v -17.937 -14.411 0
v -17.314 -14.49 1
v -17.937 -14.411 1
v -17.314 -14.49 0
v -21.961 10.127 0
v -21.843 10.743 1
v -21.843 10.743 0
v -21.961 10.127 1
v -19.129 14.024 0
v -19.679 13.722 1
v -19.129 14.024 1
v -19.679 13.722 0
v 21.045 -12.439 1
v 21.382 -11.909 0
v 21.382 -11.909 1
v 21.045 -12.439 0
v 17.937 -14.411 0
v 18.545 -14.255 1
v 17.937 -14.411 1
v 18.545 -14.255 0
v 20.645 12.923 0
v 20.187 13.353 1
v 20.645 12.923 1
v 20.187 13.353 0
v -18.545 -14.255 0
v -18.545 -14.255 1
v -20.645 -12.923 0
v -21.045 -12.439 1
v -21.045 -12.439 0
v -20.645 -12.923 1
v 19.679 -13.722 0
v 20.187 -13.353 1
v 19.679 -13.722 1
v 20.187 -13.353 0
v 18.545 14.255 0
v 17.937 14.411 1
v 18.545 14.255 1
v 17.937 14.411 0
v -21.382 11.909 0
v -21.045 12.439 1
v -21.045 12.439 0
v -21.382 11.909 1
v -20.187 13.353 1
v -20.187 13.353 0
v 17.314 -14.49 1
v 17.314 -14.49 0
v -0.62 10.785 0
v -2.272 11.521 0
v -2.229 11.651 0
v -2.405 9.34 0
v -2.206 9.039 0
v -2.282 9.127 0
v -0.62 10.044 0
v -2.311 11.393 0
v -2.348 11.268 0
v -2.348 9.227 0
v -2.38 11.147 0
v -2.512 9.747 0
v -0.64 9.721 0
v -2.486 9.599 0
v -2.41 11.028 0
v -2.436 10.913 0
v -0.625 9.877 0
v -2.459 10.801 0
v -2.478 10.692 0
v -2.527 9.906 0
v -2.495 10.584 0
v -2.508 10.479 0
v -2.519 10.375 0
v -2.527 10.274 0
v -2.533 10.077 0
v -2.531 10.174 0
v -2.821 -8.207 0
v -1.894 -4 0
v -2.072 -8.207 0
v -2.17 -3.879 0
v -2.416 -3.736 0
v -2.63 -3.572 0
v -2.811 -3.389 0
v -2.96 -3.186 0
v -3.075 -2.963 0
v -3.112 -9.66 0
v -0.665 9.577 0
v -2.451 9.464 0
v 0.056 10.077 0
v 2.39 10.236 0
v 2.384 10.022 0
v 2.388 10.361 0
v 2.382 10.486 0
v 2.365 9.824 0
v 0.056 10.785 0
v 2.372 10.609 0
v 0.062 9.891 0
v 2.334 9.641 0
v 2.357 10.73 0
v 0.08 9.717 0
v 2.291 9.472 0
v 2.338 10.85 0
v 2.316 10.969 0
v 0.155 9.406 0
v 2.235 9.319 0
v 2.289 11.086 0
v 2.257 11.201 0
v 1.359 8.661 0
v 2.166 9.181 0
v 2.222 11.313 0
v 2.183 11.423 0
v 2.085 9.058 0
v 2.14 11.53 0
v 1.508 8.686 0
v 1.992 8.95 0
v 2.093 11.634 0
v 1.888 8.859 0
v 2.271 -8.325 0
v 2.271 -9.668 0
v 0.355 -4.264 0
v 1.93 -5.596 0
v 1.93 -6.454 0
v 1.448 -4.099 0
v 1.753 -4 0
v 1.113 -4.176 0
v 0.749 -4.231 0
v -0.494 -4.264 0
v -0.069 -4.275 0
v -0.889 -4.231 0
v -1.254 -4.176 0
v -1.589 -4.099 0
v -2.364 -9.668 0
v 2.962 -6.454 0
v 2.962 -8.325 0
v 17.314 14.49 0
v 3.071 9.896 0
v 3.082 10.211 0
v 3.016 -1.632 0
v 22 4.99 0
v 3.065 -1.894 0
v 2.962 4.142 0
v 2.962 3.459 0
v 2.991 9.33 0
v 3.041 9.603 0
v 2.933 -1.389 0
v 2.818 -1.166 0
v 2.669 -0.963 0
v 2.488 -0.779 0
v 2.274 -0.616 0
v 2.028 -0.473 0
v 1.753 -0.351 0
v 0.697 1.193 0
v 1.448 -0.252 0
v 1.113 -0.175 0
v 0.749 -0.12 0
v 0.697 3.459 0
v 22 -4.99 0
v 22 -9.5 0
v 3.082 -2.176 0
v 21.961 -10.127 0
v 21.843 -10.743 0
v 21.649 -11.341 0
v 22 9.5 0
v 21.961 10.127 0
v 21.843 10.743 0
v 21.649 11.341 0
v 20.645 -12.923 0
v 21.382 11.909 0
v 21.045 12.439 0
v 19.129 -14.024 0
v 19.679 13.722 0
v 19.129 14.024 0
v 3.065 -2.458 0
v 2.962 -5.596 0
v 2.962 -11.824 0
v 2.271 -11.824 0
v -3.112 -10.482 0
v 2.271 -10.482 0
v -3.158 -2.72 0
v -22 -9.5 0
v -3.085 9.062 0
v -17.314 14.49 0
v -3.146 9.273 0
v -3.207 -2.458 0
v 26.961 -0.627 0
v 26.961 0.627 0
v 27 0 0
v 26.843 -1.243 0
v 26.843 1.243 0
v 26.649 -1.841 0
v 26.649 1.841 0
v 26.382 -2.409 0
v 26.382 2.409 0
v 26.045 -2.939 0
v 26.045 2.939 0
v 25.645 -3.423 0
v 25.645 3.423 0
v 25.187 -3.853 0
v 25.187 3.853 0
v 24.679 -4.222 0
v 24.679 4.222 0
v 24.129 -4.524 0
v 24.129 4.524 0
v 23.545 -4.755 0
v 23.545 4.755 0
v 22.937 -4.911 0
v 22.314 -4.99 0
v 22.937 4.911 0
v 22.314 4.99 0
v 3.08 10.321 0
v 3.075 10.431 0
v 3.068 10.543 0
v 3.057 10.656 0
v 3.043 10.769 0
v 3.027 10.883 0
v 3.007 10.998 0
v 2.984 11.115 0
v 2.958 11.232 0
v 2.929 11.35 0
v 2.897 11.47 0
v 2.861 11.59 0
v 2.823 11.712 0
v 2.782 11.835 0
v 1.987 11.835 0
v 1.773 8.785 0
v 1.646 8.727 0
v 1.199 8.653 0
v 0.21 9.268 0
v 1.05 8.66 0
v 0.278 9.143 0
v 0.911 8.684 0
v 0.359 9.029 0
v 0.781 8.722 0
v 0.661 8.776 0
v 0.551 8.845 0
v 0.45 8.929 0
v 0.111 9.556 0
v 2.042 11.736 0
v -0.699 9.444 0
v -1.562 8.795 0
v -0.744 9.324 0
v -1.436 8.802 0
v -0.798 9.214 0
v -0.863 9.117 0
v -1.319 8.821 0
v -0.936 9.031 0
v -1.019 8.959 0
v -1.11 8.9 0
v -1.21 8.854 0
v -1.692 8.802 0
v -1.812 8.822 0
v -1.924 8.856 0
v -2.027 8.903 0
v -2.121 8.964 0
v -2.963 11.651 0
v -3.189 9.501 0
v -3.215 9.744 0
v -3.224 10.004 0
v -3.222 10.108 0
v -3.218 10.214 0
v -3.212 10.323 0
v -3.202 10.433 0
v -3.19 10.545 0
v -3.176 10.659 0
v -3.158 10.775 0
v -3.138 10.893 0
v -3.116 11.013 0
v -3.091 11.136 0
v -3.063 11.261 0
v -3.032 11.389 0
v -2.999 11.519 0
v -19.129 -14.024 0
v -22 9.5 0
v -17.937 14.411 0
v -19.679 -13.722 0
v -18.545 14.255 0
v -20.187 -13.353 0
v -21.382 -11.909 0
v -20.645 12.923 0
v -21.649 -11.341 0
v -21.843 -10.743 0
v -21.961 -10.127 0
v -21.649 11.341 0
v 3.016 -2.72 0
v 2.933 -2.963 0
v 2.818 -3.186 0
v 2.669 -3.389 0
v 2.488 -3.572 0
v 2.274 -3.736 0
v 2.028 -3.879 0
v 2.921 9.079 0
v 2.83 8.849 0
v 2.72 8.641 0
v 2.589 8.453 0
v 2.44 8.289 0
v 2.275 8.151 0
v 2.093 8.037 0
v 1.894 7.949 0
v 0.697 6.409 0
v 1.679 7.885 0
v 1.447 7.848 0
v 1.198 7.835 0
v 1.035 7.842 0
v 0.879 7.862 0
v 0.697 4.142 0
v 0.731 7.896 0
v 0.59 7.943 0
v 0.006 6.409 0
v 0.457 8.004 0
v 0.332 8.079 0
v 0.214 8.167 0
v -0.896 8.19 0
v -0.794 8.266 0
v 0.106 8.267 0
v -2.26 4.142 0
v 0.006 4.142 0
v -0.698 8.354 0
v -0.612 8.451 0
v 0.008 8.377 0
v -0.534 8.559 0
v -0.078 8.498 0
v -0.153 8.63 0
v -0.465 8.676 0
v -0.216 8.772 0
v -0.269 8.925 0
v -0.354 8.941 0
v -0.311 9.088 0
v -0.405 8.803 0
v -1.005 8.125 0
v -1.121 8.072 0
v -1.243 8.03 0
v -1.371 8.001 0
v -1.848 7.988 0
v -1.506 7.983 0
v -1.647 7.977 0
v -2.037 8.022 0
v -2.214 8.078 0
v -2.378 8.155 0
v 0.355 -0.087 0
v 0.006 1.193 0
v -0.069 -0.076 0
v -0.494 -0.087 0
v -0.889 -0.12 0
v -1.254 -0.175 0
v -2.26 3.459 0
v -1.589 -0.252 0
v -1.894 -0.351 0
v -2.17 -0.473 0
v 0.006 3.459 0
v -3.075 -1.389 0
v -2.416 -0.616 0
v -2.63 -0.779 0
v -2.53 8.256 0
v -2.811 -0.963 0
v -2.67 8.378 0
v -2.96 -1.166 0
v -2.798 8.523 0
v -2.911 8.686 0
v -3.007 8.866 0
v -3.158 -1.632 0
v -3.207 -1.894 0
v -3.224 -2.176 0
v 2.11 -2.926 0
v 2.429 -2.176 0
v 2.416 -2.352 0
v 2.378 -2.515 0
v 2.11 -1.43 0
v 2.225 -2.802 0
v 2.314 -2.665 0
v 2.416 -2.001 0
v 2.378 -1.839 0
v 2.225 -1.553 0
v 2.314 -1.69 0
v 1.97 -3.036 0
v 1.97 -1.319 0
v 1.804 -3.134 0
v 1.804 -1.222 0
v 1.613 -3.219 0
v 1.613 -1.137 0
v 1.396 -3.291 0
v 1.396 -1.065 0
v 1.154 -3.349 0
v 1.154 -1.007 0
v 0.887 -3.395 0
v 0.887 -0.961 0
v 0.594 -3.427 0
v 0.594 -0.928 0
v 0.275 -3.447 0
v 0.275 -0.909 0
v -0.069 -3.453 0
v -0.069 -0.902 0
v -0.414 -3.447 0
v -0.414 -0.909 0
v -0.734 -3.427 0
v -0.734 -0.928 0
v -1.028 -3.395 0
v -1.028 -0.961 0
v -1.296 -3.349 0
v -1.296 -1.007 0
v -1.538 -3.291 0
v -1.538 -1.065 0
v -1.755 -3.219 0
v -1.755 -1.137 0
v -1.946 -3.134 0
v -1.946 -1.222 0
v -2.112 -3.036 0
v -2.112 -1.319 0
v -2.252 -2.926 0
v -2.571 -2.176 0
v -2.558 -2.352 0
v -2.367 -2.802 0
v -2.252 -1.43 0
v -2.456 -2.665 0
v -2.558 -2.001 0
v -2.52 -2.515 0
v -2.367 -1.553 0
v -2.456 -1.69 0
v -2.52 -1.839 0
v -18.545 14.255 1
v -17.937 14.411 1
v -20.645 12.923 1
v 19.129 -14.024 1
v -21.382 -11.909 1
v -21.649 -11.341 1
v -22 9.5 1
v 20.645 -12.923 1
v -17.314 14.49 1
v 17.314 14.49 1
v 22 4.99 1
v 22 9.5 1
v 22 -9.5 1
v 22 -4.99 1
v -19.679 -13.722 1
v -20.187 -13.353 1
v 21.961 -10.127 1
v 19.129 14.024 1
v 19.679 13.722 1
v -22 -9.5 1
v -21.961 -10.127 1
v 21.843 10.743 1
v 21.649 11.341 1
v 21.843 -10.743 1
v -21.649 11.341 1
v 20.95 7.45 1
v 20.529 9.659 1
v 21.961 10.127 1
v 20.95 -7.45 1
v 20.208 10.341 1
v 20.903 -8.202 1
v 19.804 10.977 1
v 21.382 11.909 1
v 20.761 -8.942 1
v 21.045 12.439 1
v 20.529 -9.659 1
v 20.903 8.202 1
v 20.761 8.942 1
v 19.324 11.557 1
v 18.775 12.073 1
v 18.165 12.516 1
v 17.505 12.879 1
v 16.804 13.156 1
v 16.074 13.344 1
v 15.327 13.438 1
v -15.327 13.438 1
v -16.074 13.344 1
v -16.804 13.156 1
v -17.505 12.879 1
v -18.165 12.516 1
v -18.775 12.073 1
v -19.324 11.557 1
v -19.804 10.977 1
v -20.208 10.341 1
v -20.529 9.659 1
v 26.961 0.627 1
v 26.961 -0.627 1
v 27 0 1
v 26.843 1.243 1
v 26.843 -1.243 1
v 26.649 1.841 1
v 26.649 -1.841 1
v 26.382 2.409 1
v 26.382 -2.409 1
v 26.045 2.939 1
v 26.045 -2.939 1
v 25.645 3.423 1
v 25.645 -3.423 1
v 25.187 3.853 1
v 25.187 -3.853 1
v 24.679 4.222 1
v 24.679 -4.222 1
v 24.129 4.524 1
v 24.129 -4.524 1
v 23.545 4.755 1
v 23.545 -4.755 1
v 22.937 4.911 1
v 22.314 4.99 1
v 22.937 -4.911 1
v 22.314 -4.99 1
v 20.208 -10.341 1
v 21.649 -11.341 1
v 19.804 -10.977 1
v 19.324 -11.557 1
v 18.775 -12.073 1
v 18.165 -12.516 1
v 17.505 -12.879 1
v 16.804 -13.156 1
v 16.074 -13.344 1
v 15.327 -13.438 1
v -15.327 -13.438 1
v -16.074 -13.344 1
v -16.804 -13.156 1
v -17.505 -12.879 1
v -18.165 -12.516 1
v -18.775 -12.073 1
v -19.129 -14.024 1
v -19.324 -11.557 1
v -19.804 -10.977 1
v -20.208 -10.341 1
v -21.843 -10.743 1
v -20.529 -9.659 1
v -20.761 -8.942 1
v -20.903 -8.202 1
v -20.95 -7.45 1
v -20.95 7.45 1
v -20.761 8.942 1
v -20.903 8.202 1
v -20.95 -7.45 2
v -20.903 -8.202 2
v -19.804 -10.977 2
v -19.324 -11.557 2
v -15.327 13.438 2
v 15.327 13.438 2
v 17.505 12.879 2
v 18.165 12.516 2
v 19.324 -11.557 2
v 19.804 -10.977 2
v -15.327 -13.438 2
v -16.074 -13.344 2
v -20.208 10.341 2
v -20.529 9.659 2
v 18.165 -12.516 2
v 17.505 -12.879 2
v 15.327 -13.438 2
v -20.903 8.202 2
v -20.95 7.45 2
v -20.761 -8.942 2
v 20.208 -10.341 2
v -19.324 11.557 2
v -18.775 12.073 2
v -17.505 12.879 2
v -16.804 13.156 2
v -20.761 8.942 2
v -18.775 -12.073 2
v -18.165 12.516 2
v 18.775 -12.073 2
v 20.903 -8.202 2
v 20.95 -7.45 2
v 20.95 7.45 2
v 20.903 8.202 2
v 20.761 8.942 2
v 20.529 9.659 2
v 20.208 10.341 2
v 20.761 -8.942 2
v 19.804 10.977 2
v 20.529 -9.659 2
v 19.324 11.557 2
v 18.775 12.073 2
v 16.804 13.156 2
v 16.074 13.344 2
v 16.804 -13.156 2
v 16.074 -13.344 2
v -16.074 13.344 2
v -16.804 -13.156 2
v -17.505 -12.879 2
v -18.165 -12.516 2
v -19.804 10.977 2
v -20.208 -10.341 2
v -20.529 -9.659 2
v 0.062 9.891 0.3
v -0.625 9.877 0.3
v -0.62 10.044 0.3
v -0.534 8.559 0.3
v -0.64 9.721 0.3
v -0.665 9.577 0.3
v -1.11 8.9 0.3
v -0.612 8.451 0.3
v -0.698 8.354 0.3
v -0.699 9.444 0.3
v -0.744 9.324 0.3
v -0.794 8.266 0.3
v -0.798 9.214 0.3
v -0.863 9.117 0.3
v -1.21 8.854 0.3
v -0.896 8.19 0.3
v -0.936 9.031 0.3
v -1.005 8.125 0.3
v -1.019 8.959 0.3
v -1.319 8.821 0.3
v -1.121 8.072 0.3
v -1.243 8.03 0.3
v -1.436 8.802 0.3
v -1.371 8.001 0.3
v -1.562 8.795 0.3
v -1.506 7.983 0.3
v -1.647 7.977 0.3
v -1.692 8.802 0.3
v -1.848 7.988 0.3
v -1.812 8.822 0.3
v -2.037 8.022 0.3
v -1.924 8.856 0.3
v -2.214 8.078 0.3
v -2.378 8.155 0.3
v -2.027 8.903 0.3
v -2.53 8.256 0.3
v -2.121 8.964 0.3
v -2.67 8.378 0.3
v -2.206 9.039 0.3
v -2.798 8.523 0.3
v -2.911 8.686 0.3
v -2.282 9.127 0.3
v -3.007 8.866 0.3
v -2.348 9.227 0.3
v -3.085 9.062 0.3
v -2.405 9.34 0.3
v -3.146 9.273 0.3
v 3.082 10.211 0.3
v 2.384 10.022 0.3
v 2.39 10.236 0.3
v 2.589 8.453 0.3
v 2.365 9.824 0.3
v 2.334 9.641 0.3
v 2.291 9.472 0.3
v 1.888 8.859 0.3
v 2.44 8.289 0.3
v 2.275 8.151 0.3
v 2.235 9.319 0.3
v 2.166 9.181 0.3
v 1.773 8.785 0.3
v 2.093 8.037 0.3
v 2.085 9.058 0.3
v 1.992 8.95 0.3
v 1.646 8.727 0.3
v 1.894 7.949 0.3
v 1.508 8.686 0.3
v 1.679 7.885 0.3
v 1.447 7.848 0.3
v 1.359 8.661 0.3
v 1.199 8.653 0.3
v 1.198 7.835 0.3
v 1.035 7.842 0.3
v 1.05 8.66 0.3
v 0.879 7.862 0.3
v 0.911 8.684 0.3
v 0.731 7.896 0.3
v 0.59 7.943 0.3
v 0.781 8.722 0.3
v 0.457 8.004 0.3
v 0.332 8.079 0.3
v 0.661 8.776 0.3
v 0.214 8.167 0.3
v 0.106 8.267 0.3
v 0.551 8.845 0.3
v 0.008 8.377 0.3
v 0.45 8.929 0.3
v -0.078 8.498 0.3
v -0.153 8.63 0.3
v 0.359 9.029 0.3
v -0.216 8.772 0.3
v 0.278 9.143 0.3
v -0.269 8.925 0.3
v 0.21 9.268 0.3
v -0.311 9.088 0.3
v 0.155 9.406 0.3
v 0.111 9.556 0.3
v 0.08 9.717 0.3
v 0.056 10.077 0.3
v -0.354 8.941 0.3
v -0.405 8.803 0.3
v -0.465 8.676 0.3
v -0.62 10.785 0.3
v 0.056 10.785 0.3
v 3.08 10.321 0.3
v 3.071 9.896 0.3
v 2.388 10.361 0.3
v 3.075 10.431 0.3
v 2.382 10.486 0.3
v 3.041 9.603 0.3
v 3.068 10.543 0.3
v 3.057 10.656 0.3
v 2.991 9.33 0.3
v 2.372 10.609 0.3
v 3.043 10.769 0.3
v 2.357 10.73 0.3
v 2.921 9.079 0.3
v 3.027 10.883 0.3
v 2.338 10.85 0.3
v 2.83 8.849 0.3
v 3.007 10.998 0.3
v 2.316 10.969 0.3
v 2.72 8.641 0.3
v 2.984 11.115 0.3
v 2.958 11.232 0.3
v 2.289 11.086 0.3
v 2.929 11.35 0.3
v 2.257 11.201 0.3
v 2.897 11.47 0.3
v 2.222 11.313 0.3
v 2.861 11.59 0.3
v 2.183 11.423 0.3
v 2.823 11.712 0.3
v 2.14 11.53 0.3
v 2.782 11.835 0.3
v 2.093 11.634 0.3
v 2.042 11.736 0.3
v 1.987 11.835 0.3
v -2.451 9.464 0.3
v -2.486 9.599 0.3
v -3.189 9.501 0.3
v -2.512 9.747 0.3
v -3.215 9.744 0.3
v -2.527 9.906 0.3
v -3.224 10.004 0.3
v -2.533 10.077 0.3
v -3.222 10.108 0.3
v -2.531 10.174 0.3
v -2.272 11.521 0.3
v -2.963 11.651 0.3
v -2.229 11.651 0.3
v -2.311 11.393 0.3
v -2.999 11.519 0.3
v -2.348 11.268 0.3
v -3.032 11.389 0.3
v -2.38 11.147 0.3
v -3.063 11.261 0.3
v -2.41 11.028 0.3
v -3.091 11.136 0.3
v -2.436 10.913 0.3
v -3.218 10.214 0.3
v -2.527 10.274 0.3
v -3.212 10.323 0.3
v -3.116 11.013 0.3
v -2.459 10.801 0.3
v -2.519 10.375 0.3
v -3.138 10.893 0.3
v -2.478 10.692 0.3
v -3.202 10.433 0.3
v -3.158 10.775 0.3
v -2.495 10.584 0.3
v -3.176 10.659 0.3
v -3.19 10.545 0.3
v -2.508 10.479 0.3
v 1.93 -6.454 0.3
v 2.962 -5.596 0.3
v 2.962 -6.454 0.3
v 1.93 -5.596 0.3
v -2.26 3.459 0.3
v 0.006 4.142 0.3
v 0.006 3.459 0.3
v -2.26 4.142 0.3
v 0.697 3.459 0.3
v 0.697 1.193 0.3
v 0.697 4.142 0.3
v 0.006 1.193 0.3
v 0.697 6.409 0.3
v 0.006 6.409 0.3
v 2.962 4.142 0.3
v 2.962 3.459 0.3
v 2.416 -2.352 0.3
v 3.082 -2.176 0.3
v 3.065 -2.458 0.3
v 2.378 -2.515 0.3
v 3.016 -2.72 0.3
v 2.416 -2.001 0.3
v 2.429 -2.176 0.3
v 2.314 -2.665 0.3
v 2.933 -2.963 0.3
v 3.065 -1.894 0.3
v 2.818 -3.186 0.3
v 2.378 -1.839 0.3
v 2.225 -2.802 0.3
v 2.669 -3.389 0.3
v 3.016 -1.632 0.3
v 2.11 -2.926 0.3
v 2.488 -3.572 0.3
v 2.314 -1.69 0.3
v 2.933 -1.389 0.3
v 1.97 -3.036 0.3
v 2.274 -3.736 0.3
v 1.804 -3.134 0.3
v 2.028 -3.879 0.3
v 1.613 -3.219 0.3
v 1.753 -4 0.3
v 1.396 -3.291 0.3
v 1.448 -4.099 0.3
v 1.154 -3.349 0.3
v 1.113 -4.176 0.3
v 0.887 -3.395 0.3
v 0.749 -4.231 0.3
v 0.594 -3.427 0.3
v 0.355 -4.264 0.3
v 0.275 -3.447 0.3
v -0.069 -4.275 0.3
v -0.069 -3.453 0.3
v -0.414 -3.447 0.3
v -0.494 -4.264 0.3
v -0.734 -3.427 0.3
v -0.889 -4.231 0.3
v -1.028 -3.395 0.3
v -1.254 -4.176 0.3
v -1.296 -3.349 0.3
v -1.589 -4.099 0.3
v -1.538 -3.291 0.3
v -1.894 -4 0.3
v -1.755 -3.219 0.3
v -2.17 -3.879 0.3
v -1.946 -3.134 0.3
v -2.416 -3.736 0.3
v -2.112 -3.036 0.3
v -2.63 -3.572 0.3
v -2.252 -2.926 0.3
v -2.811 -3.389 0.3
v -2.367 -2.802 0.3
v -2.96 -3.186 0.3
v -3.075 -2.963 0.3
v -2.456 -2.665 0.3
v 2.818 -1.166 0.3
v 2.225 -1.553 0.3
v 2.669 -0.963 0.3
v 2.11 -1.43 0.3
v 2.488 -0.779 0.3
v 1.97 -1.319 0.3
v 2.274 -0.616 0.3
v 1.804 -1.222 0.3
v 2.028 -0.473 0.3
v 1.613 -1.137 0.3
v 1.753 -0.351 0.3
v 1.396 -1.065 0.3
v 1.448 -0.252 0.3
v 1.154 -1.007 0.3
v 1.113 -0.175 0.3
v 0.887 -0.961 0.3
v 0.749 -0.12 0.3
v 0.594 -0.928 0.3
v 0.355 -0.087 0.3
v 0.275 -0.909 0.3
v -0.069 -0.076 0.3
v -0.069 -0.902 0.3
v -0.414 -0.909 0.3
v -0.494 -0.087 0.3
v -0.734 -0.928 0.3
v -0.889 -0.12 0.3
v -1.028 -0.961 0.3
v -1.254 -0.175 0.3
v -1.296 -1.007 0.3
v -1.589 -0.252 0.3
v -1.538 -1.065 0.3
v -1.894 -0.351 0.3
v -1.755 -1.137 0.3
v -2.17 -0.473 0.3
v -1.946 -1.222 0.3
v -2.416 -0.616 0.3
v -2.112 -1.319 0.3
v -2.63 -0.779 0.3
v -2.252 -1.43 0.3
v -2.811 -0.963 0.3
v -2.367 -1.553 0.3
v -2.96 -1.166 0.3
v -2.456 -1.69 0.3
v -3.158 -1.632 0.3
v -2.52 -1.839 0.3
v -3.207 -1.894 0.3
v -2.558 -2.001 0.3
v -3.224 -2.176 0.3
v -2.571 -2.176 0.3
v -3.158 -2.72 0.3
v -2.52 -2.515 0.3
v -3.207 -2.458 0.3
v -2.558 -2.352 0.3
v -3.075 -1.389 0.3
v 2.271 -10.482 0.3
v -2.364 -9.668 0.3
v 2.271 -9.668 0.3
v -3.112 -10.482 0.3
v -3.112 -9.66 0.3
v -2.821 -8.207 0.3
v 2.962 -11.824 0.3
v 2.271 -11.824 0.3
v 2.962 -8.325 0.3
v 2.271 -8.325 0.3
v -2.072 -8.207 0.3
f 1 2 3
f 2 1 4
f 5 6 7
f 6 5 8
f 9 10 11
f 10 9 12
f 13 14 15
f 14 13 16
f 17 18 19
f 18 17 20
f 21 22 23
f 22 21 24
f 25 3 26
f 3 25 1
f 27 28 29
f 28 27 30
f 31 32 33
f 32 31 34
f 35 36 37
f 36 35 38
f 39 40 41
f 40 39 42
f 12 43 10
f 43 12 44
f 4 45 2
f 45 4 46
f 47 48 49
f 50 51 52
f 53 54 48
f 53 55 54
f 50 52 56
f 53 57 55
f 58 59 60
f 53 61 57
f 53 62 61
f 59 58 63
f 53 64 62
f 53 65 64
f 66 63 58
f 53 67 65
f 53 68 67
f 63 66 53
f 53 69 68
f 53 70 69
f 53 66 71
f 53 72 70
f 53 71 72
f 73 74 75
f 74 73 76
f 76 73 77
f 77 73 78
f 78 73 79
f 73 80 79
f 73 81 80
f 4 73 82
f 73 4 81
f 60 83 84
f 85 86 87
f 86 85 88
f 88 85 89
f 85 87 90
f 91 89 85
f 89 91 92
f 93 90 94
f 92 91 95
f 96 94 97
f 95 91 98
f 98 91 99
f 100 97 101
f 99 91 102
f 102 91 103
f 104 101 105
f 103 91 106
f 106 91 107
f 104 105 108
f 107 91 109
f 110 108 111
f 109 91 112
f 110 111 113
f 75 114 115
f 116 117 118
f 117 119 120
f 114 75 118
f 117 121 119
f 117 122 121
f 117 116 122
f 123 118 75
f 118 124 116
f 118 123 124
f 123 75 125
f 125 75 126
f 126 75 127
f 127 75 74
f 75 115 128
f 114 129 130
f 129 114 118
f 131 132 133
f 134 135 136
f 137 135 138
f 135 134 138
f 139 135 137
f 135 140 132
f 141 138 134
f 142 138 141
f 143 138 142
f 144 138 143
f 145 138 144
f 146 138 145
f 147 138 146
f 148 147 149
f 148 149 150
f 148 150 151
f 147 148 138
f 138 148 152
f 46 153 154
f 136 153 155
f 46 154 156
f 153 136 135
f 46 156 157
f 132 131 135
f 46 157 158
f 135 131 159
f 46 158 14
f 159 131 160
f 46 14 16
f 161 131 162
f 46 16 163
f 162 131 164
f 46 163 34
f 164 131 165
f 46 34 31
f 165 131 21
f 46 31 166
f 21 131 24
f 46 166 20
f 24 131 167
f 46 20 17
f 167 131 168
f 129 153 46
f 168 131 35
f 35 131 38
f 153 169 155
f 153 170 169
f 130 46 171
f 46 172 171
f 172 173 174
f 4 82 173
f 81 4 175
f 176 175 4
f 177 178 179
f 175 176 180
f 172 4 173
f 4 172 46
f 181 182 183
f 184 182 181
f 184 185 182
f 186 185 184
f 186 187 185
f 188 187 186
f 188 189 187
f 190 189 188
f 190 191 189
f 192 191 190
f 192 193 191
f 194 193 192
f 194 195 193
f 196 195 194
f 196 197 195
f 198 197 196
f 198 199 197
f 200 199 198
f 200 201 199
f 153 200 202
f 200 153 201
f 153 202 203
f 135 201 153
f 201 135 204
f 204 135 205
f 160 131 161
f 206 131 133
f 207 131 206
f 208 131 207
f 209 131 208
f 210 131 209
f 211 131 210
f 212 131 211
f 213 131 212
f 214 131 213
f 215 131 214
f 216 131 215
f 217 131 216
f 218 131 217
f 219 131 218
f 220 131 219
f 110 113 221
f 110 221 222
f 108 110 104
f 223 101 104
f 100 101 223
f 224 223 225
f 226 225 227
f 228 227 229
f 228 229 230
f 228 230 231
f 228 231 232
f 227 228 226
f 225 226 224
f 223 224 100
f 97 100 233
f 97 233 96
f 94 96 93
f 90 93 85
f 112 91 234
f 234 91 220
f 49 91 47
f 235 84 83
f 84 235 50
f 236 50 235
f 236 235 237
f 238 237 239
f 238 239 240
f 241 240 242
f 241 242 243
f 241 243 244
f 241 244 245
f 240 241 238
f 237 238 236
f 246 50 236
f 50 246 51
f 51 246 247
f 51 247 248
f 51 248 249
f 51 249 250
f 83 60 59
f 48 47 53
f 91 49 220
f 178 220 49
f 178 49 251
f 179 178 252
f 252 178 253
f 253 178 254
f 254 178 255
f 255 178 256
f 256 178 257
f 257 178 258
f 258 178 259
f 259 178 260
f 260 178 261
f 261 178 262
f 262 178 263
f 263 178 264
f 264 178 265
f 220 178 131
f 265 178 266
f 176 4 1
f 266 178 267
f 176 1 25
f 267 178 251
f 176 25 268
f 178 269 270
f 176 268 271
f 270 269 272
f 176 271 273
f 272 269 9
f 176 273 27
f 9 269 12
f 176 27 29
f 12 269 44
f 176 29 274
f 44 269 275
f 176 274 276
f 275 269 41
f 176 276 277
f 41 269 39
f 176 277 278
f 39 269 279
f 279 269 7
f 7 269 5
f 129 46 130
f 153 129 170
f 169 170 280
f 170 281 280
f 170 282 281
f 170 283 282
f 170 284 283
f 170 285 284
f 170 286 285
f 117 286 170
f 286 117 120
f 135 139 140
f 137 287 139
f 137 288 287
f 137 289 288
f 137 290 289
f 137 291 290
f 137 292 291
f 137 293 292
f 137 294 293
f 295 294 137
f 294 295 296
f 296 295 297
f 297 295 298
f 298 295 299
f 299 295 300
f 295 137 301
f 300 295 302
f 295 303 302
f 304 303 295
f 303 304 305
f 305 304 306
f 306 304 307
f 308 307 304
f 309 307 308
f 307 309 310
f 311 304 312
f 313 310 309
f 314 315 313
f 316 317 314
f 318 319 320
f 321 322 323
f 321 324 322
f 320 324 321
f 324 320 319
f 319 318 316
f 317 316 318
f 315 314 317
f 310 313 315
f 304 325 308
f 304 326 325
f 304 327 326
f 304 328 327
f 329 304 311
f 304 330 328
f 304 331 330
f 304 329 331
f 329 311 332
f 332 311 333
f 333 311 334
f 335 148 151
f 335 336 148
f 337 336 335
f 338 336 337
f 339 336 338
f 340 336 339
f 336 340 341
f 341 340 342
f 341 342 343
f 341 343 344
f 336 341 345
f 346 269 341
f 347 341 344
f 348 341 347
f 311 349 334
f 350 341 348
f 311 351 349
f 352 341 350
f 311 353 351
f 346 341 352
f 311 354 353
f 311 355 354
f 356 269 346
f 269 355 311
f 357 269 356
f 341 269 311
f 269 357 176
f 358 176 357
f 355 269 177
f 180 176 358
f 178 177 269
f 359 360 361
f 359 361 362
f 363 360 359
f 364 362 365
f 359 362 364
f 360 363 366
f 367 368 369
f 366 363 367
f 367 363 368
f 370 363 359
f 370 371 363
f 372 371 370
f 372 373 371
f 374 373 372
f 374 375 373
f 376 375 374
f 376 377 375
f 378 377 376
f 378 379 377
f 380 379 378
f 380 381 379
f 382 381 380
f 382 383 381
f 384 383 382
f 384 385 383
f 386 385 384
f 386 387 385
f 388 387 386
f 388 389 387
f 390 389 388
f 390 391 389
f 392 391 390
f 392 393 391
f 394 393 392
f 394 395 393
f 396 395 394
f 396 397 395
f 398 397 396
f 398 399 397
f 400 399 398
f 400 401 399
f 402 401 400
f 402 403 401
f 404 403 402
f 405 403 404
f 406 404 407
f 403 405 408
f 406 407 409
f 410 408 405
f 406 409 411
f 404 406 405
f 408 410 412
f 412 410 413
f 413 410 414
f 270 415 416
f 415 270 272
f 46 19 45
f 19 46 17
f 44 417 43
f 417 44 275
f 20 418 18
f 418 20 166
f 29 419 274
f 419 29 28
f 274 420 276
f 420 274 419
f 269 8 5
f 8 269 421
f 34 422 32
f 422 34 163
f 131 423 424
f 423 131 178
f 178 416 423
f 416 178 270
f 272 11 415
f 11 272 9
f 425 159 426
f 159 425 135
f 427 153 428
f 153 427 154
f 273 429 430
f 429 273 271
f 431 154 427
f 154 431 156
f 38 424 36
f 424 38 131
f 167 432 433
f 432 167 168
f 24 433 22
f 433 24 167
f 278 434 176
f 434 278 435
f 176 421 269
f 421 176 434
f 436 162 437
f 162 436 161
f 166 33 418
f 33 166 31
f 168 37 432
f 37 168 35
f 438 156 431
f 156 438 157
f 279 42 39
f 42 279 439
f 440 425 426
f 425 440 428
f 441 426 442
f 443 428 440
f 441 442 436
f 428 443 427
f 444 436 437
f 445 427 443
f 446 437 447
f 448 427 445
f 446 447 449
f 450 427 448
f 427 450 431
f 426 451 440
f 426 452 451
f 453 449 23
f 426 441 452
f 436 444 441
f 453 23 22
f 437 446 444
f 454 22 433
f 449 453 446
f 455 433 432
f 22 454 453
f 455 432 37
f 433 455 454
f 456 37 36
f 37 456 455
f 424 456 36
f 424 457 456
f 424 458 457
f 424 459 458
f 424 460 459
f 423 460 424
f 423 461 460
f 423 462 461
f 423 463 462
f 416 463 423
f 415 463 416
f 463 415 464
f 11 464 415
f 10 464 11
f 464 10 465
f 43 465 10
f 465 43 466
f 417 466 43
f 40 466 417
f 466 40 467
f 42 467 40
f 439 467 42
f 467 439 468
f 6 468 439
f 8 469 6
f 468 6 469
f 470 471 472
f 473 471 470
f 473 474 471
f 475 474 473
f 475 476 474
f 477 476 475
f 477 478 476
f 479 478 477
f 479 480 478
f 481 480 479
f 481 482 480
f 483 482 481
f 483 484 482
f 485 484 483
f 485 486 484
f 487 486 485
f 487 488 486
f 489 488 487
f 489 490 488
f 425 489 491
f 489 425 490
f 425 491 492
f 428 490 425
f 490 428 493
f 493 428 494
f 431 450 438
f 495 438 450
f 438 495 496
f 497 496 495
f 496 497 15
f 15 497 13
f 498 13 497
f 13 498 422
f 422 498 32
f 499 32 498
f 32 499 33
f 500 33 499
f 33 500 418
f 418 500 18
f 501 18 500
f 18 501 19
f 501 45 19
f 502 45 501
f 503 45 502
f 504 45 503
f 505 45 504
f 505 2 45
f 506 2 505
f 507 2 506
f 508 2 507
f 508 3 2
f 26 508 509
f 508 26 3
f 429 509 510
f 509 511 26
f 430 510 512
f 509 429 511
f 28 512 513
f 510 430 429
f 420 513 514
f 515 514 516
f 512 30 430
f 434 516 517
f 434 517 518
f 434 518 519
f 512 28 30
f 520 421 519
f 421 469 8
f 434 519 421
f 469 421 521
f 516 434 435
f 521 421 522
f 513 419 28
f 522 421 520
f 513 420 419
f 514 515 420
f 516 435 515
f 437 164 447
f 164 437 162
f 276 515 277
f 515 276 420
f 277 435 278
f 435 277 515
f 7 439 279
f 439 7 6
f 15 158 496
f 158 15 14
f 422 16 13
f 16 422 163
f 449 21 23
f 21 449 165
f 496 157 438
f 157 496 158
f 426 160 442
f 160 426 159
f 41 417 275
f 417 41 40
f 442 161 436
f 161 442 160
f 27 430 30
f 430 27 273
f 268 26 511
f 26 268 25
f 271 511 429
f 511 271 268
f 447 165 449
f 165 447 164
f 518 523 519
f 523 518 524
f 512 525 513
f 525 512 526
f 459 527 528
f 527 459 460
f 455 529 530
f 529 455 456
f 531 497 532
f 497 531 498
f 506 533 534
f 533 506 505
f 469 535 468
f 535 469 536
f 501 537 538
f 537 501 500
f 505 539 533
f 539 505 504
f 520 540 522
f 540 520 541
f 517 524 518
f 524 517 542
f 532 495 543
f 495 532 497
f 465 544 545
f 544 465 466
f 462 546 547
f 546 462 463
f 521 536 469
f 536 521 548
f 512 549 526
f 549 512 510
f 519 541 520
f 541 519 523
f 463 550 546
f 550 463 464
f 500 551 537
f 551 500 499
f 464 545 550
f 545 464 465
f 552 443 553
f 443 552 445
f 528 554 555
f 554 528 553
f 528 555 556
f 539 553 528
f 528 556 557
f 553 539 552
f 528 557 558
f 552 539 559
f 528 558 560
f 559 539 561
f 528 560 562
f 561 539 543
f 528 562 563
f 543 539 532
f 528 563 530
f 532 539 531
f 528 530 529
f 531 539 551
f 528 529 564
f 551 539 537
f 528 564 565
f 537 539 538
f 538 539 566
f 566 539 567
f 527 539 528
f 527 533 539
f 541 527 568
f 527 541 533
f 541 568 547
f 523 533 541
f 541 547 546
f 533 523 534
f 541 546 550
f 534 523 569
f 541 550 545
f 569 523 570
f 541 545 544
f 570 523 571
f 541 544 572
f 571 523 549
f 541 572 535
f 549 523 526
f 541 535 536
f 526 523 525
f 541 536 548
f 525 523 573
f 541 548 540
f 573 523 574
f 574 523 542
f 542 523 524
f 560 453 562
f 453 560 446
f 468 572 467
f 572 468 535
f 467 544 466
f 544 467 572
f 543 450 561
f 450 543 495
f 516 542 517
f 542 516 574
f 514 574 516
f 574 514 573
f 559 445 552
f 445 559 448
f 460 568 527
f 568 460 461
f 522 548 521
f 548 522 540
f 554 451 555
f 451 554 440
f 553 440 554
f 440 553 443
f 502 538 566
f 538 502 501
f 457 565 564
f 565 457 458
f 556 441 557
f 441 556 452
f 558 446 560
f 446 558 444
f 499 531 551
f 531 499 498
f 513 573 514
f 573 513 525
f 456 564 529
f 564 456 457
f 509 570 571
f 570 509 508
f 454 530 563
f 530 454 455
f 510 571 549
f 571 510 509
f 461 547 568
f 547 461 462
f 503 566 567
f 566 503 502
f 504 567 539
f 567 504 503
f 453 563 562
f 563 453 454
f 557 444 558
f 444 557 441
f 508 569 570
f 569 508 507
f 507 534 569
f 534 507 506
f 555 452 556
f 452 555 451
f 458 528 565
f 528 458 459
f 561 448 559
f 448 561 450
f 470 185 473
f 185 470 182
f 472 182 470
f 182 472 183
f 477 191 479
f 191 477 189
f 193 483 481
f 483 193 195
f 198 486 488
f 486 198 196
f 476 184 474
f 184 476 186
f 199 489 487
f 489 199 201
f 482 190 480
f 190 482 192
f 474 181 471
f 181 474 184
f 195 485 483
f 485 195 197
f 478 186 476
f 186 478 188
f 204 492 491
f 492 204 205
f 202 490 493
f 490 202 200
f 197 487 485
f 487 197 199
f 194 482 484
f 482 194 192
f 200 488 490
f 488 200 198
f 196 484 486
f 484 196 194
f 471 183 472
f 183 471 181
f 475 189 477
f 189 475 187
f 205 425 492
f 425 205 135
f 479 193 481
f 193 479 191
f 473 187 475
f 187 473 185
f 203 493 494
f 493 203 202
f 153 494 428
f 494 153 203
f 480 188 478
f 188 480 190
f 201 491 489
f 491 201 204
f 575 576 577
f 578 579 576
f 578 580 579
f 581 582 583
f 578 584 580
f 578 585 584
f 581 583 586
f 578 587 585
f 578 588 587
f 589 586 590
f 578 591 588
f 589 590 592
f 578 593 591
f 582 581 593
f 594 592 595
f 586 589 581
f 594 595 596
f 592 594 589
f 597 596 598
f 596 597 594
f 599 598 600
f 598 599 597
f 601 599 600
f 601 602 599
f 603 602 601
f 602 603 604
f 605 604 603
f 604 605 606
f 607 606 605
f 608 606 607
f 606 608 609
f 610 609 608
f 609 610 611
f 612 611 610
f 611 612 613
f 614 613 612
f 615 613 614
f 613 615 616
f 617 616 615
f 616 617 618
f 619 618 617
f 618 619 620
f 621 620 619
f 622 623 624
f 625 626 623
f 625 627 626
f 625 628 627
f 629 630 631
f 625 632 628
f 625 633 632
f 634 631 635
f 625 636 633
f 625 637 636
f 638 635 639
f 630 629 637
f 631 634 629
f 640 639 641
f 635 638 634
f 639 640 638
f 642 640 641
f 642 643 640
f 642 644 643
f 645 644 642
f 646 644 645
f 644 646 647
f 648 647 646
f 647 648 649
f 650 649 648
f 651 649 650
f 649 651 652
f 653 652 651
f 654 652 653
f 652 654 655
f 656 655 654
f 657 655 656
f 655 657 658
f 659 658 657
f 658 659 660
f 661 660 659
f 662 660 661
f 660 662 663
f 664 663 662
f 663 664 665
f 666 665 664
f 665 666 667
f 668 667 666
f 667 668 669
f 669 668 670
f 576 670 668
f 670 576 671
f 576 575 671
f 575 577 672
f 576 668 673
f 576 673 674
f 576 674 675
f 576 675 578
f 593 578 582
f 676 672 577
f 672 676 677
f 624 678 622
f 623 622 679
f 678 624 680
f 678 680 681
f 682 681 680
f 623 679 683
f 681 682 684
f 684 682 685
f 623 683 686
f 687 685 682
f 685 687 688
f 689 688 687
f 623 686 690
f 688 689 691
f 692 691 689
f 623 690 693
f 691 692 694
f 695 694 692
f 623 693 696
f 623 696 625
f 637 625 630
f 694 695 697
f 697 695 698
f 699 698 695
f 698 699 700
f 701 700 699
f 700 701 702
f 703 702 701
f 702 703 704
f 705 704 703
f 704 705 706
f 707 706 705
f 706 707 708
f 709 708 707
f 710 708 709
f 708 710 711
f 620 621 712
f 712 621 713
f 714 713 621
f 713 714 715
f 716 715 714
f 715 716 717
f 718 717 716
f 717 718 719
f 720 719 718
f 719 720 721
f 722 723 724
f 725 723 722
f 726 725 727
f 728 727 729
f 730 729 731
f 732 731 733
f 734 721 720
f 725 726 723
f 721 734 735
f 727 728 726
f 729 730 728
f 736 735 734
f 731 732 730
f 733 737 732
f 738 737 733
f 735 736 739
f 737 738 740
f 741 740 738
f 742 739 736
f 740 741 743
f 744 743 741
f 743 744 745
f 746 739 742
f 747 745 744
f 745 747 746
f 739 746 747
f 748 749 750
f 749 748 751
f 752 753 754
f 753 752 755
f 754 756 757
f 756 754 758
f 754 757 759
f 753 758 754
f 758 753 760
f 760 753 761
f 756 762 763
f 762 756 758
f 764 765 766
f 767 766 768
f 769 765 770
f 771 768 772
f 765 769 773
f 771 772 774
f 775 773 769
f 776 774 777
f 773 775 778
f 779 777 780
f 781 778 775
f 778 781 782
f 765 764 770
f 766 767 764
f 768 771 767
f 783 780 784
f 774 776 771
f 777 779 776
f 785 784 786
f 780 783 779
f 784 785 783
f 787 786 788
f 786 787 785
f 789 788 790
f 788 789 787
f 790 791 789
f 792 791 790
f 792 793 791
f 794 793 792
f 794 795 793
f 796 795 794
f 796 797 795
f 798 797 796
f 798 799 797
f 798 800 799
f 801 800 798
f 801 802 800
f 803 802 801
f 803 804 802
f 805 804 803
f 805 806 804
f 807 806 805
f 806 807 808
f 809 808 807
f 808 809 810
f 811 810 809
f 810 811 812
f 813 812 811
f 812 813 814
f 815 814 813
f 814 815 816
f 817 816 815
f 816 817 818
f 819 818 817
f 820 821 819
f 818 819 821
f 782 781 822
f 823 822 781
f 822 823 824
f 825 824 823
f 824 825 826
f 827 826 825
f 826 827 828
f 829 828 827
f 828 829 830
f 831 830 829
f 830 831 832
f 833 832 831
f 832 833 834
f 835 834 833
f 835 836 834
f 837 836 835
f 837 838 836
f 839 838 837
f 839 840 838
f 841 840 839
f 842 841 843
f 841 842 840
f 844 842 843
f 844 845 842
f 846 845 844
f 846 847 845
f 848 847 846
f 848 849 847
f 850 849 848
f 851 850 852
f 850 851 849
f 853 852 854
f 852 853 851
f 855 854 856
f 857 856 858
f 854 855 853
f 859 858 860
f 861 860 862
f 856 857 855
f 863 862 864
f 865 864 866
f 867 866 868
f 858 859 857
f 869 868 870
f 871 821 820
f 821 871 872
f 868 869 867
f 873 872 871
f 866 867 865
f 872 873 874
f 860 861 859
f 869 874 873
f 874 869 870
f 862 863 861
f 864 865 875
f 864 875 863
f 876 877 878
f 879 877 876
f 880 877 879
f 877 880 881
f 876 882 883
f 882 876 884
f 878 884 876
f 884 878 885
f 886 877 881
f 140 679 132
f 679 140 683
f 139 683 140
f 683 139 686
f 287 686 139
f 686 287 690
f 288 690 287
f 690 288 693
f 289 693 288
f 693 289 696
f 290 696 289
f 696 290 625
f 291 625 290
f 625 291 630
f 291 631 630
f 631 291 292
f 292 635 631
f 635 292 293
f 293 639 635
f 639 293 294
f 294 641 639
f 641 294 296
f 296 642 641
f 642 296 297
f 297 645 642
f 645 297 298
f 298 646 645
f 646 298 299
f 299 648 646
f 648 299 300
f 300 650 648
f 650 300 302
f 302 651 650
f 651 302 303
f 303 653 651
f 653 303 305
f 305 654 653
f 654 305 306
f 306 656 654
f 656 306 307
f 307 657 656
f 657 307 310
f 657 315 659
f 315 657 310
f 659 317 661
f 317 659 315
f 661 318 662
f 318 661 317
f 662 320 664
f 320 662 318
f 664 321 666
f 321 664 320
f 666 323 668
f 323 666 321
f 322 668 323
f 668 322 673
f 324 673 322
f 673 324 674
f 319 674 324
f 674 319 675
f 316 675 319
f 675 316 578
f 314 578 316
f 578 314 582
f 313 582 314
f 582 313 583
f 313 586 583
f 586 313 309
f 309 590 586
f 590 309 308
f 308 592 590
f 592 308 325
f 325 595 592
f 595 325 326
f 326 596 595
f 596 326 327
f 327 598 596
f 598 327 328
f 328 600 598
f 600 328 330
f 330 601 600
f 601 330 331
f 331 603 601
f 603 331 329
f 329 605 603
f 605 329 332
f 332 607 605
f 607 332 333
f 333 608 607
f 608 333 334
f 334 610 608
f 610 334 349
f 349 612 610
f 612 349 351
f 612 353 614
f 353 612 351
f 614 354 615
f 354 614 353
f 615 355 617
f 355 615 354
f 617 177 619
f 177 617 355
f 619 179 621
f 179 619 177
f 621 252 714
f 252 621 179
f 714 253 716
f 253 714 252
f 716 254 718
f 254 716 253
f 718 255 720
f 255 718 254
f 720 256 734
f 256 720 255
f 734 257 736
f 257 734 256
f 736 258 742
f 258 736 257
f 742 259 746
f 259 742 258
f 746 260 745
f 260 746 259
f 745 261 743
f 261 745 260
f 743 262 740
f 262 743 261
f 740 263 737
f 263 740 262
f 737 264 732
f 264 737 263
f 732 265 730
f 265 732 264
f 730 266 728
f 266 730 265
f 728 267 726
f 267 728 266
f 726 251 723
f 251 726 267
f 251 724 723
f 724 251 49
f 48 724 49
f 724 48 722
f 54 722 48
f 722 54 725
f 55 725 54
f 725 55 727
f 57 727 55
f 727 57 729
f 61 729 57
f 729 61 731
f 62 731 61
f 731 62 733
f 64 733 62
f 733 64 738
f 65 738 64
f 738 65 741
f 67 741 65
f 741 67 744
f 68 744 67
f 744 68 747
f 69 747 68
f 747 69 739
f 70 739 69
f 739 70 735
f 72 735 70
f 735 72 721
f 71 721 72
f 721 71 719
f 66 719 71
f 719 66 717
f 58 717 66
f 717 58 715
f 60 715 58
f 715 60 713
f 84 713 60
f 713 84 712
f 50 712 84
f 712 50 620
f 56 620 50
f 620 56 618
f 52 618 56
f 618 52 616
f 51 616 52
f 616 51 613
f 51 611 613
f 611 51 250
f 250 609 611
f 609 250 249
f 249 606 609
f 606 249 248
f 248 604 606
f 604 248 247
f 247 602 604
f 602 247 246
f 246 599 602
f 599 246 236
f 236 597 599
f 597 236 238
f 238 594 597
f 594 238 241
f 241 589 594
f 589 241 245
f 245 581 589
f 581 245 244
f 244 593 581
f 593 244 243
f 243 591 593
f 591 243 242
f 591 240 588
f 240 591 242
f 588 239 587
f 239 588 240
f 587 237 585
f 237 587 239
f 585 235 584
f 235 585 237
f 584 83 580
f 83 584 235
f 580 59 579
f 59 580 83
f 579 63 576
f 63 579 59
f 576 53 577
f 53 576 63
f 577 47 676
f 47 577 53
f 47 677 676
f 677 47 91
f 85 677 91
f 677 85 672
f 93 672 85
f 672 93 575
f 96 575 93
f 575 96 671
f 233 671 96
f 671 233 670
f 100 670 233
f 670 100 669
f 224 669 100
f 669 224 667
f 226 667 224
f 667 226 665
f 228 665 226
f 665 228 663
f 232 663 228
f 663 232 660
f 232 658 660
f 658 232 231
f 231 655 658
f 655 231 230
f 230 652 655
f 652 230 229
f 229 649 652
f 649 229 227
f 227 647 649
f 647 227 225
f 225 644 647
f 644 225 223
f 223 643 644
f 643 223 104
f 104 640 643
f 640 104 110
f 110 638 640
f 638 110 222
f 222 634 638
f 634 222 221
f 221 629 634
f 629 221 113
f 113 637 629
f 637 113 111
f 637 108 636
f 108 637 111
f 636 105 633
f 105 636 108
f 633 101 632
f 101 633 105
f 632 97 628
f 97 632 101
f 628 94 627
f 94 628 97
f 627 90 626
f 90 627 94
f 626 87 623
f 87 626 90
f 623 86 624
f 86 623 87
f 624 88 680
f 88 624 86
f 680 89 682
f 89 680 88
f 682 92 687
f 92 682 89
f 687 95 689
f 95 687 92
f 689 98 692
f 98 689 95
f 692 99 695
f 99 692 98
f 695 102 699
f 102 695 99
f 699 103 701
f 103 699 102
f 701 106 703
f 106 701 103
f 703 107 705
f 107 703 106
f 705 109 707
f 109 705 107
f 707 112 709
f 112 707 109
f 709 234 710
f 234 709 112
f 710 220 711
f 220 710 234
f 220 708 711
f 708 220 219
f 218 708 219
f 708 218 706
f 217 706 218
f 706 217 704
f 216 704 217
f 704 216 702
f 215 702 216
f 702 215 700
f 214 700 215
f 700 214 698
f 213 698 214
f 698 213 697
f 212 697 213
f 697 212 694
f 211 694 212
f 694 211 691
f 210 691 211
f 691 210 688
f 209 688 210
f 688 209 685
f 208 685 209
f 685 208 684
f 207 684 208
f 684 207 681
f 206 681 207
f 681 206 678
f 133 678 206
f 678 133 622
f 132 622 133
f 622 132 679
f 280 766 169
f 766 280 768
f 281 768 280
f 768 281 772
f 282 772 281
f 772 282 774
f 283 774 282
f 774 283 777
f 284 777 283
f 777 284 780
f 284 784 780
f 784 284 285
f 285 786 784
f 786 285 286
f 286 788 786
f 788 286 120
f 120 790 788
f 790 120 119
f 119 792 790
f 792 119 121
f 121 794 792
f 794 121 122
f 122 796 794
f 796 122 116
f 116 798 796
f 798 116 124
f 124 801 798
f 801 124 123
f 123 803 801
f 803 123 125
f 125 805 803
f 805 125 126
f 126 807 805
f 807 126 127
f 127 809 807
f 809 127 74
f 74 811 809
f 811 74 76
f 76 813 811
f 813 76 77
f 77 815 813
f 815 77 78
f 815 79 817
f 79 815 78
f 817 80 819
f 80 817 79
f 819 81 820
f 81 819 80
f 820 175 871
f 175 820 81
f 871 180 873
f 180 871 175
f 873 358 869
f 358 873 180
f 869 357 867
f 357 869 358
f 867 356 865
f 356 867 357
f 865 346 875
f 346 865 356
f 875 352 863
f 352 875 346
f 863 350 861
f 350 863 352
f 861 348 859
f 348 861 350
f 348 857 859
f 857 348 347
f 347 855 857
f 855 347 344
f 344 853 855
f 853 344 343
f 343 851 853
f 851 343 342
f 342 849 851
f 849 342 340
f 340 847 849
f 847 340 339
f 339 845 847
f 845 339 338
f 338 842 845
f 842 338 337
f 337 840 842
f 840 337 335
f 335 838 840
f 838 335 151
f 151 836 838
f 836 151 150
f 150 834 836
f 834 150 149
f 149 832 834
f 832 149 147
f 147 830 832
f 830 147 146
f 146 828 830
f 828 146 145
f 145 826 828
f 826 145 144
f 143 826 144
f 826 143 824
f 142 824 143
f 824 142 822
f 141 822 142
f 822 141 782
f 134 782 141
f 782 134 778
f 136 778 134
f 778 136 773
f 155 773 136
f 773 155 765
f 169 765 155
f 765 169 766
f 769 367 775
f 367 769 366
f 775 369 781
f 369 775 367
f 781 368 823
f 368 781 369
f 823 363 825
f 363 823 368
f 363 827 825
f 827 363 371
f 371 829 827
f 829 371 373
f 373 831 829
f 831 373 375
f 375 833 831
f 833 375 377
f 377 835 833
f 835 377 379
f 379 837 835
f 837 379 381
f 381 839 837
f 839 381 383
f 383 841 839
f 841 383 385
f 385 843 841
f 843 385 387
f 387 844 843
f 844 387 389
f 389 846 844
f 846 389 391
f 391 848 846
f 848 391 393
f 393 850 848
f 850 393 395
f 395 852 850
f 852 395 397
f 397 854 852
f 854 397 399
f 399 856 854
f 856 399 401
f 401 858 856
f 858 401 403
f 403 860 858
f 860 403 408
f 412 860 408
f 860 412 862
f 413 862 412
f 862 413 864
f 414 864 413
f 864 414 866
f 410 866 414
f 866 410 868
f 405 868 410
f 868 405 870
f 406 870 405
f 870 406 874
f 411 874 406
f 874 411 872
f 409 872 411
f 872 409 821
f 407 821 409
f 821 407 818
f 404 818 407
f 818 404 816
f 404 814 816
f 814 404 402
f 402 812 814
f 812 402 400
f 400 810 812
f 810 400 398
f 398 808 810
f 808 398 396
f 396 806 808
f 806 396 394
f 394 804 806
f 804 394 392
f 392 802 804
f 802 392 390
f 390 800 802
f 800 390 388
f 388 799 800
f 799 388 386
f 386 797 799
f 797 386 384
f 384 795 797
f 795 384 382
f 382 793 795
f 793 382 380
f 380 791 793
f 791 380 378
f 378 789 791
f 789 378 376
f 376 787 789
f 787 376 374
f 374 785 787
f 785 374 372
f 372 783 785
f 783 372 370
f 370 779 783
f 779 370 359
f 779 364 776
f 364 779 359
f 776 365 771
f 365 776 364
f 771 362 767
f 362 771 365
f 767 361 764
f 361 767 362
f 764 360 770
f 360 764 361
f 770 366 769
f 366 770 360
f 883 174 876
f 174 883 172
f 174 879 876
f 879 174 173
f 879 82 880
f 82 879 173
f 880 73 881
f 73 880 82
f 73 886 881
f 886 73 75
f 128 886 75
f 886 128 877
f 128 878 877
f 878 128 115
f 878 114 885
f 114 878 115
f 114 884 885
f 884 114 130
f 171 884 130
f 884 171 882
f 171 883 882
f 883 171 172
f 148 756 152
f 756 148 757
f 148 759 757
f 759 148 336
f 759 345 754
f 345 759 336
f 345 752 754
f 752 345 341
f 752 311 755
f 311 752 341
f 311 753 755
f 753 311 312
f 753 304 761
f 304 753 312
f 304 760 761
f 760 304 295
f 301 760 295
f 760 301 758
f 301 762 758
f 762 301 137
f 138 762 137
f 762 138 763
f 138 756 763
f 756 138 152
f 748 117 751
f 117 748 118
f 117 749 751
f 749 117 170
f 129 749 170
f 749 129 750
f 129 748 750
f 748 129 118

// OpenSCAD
$fn = 50;


difference() {
	union() {
		translate(v = [0, 0, 0]) {
			rotate(a = [0, 0, 0]) {
				hull() {
					translate(v = [-17.0000000000, 9.5000000000, 0]) {
						rotate(a = [0, 0, 0]) {
							translate(v = [0, 0, 0]) {
								rotate(a = [0, 0, 0]) {
									cylinder(h = 1, r = 5);
								}
							}
						}
					}
					translate(v = [17.0000000000, 9.5000000000, 0]) {
						rotate(a = [0, 0, 0]) {
							translate(v = [0, 0, 0]) {
								rotate(a = [0, 0, 0]) {
									cylinder(h = 1, r = 5);
								}
							}
						}
					}
					translate(v = [-17.0000000000, -9.5000000000, 0]) {
						rotate(a = [0, 0, 0]) {
							translate(v = [0, 0, 0]) {
								rotate(a = [0, 0, 0]) {
									cylinder(h = 1, r = 5);
								}
							}
						}
					}
					translate(v = [17.0000000000, -9.5000000000, 0]) {
						rotate(a = [0, 0, 0]) {
							translate(v = [0, 0, 0]) {
								rotate(a = [0, 0, 0]) {
									cylinder(h = 1, r = 5);
								}
							}
						}
					}
				}
			}
		}
		translate(v = [0, 0, 0]) {
			rotate(a = [0, 0, 0]) {
				hull() {
					translate(v = [-14.9500000000, 7.4500000000, 0]) {
						rotate(a = [0, 0, 0]) {
							translate(v = [0, 0, 0]) {
								rotate(a = [0, 0, 0]) {
									cylinder(h = 2, r = 6);
								}
							}
						}
					}
					translate(v = [14.9500000000, 7.4500000000, 0]) {
						rotate(a = [0, 0, 0]) {
							translate(v = [0, 0, 0]) {
								rotate(a = [0, 0, 0]) {
									cylinder(h = 2, r = 6);
								}
							}
						}
					}
					translate(v = [-14.9500000000, -7.4500000000, 0]) {
						rotate(a = [0, 0, 0]) {
							translate(v = [0, 0, 0]) {
								rotate(a = [0, 0, 0]) {
									cylinder(h = 2, r = 6);
								}
							}
						}
					}
					translate(v = [14.9500000000, -7.4500000000, 0]) {
						rotate(a = [0, 0, 0]) {
							translate(v = [0, 0, 0]) {
								rotate(a = [0, 0, 0]) {
									cylinder(h = 2, r = 6);
								}
							}
						}
					}
				}
			}
		}
		translate(v = [22.0000000000, 0, 0.0000000000]) {
			rotate(a = [0, 0, 0]) {
				cylinder(h = 1, r = 5);
			}
		}
	}
	union() {
		translate(v = [0, 0, 0.3000000000]) {
			rotate(a = [0, 180, 90]) {
				linear_extrude(height = 0.3000000000) {
					text(font = "Candara:Light", halign = "center", size = 6, text = "3+0.1", valign = "center");
				}
			}
		}
	}
}
